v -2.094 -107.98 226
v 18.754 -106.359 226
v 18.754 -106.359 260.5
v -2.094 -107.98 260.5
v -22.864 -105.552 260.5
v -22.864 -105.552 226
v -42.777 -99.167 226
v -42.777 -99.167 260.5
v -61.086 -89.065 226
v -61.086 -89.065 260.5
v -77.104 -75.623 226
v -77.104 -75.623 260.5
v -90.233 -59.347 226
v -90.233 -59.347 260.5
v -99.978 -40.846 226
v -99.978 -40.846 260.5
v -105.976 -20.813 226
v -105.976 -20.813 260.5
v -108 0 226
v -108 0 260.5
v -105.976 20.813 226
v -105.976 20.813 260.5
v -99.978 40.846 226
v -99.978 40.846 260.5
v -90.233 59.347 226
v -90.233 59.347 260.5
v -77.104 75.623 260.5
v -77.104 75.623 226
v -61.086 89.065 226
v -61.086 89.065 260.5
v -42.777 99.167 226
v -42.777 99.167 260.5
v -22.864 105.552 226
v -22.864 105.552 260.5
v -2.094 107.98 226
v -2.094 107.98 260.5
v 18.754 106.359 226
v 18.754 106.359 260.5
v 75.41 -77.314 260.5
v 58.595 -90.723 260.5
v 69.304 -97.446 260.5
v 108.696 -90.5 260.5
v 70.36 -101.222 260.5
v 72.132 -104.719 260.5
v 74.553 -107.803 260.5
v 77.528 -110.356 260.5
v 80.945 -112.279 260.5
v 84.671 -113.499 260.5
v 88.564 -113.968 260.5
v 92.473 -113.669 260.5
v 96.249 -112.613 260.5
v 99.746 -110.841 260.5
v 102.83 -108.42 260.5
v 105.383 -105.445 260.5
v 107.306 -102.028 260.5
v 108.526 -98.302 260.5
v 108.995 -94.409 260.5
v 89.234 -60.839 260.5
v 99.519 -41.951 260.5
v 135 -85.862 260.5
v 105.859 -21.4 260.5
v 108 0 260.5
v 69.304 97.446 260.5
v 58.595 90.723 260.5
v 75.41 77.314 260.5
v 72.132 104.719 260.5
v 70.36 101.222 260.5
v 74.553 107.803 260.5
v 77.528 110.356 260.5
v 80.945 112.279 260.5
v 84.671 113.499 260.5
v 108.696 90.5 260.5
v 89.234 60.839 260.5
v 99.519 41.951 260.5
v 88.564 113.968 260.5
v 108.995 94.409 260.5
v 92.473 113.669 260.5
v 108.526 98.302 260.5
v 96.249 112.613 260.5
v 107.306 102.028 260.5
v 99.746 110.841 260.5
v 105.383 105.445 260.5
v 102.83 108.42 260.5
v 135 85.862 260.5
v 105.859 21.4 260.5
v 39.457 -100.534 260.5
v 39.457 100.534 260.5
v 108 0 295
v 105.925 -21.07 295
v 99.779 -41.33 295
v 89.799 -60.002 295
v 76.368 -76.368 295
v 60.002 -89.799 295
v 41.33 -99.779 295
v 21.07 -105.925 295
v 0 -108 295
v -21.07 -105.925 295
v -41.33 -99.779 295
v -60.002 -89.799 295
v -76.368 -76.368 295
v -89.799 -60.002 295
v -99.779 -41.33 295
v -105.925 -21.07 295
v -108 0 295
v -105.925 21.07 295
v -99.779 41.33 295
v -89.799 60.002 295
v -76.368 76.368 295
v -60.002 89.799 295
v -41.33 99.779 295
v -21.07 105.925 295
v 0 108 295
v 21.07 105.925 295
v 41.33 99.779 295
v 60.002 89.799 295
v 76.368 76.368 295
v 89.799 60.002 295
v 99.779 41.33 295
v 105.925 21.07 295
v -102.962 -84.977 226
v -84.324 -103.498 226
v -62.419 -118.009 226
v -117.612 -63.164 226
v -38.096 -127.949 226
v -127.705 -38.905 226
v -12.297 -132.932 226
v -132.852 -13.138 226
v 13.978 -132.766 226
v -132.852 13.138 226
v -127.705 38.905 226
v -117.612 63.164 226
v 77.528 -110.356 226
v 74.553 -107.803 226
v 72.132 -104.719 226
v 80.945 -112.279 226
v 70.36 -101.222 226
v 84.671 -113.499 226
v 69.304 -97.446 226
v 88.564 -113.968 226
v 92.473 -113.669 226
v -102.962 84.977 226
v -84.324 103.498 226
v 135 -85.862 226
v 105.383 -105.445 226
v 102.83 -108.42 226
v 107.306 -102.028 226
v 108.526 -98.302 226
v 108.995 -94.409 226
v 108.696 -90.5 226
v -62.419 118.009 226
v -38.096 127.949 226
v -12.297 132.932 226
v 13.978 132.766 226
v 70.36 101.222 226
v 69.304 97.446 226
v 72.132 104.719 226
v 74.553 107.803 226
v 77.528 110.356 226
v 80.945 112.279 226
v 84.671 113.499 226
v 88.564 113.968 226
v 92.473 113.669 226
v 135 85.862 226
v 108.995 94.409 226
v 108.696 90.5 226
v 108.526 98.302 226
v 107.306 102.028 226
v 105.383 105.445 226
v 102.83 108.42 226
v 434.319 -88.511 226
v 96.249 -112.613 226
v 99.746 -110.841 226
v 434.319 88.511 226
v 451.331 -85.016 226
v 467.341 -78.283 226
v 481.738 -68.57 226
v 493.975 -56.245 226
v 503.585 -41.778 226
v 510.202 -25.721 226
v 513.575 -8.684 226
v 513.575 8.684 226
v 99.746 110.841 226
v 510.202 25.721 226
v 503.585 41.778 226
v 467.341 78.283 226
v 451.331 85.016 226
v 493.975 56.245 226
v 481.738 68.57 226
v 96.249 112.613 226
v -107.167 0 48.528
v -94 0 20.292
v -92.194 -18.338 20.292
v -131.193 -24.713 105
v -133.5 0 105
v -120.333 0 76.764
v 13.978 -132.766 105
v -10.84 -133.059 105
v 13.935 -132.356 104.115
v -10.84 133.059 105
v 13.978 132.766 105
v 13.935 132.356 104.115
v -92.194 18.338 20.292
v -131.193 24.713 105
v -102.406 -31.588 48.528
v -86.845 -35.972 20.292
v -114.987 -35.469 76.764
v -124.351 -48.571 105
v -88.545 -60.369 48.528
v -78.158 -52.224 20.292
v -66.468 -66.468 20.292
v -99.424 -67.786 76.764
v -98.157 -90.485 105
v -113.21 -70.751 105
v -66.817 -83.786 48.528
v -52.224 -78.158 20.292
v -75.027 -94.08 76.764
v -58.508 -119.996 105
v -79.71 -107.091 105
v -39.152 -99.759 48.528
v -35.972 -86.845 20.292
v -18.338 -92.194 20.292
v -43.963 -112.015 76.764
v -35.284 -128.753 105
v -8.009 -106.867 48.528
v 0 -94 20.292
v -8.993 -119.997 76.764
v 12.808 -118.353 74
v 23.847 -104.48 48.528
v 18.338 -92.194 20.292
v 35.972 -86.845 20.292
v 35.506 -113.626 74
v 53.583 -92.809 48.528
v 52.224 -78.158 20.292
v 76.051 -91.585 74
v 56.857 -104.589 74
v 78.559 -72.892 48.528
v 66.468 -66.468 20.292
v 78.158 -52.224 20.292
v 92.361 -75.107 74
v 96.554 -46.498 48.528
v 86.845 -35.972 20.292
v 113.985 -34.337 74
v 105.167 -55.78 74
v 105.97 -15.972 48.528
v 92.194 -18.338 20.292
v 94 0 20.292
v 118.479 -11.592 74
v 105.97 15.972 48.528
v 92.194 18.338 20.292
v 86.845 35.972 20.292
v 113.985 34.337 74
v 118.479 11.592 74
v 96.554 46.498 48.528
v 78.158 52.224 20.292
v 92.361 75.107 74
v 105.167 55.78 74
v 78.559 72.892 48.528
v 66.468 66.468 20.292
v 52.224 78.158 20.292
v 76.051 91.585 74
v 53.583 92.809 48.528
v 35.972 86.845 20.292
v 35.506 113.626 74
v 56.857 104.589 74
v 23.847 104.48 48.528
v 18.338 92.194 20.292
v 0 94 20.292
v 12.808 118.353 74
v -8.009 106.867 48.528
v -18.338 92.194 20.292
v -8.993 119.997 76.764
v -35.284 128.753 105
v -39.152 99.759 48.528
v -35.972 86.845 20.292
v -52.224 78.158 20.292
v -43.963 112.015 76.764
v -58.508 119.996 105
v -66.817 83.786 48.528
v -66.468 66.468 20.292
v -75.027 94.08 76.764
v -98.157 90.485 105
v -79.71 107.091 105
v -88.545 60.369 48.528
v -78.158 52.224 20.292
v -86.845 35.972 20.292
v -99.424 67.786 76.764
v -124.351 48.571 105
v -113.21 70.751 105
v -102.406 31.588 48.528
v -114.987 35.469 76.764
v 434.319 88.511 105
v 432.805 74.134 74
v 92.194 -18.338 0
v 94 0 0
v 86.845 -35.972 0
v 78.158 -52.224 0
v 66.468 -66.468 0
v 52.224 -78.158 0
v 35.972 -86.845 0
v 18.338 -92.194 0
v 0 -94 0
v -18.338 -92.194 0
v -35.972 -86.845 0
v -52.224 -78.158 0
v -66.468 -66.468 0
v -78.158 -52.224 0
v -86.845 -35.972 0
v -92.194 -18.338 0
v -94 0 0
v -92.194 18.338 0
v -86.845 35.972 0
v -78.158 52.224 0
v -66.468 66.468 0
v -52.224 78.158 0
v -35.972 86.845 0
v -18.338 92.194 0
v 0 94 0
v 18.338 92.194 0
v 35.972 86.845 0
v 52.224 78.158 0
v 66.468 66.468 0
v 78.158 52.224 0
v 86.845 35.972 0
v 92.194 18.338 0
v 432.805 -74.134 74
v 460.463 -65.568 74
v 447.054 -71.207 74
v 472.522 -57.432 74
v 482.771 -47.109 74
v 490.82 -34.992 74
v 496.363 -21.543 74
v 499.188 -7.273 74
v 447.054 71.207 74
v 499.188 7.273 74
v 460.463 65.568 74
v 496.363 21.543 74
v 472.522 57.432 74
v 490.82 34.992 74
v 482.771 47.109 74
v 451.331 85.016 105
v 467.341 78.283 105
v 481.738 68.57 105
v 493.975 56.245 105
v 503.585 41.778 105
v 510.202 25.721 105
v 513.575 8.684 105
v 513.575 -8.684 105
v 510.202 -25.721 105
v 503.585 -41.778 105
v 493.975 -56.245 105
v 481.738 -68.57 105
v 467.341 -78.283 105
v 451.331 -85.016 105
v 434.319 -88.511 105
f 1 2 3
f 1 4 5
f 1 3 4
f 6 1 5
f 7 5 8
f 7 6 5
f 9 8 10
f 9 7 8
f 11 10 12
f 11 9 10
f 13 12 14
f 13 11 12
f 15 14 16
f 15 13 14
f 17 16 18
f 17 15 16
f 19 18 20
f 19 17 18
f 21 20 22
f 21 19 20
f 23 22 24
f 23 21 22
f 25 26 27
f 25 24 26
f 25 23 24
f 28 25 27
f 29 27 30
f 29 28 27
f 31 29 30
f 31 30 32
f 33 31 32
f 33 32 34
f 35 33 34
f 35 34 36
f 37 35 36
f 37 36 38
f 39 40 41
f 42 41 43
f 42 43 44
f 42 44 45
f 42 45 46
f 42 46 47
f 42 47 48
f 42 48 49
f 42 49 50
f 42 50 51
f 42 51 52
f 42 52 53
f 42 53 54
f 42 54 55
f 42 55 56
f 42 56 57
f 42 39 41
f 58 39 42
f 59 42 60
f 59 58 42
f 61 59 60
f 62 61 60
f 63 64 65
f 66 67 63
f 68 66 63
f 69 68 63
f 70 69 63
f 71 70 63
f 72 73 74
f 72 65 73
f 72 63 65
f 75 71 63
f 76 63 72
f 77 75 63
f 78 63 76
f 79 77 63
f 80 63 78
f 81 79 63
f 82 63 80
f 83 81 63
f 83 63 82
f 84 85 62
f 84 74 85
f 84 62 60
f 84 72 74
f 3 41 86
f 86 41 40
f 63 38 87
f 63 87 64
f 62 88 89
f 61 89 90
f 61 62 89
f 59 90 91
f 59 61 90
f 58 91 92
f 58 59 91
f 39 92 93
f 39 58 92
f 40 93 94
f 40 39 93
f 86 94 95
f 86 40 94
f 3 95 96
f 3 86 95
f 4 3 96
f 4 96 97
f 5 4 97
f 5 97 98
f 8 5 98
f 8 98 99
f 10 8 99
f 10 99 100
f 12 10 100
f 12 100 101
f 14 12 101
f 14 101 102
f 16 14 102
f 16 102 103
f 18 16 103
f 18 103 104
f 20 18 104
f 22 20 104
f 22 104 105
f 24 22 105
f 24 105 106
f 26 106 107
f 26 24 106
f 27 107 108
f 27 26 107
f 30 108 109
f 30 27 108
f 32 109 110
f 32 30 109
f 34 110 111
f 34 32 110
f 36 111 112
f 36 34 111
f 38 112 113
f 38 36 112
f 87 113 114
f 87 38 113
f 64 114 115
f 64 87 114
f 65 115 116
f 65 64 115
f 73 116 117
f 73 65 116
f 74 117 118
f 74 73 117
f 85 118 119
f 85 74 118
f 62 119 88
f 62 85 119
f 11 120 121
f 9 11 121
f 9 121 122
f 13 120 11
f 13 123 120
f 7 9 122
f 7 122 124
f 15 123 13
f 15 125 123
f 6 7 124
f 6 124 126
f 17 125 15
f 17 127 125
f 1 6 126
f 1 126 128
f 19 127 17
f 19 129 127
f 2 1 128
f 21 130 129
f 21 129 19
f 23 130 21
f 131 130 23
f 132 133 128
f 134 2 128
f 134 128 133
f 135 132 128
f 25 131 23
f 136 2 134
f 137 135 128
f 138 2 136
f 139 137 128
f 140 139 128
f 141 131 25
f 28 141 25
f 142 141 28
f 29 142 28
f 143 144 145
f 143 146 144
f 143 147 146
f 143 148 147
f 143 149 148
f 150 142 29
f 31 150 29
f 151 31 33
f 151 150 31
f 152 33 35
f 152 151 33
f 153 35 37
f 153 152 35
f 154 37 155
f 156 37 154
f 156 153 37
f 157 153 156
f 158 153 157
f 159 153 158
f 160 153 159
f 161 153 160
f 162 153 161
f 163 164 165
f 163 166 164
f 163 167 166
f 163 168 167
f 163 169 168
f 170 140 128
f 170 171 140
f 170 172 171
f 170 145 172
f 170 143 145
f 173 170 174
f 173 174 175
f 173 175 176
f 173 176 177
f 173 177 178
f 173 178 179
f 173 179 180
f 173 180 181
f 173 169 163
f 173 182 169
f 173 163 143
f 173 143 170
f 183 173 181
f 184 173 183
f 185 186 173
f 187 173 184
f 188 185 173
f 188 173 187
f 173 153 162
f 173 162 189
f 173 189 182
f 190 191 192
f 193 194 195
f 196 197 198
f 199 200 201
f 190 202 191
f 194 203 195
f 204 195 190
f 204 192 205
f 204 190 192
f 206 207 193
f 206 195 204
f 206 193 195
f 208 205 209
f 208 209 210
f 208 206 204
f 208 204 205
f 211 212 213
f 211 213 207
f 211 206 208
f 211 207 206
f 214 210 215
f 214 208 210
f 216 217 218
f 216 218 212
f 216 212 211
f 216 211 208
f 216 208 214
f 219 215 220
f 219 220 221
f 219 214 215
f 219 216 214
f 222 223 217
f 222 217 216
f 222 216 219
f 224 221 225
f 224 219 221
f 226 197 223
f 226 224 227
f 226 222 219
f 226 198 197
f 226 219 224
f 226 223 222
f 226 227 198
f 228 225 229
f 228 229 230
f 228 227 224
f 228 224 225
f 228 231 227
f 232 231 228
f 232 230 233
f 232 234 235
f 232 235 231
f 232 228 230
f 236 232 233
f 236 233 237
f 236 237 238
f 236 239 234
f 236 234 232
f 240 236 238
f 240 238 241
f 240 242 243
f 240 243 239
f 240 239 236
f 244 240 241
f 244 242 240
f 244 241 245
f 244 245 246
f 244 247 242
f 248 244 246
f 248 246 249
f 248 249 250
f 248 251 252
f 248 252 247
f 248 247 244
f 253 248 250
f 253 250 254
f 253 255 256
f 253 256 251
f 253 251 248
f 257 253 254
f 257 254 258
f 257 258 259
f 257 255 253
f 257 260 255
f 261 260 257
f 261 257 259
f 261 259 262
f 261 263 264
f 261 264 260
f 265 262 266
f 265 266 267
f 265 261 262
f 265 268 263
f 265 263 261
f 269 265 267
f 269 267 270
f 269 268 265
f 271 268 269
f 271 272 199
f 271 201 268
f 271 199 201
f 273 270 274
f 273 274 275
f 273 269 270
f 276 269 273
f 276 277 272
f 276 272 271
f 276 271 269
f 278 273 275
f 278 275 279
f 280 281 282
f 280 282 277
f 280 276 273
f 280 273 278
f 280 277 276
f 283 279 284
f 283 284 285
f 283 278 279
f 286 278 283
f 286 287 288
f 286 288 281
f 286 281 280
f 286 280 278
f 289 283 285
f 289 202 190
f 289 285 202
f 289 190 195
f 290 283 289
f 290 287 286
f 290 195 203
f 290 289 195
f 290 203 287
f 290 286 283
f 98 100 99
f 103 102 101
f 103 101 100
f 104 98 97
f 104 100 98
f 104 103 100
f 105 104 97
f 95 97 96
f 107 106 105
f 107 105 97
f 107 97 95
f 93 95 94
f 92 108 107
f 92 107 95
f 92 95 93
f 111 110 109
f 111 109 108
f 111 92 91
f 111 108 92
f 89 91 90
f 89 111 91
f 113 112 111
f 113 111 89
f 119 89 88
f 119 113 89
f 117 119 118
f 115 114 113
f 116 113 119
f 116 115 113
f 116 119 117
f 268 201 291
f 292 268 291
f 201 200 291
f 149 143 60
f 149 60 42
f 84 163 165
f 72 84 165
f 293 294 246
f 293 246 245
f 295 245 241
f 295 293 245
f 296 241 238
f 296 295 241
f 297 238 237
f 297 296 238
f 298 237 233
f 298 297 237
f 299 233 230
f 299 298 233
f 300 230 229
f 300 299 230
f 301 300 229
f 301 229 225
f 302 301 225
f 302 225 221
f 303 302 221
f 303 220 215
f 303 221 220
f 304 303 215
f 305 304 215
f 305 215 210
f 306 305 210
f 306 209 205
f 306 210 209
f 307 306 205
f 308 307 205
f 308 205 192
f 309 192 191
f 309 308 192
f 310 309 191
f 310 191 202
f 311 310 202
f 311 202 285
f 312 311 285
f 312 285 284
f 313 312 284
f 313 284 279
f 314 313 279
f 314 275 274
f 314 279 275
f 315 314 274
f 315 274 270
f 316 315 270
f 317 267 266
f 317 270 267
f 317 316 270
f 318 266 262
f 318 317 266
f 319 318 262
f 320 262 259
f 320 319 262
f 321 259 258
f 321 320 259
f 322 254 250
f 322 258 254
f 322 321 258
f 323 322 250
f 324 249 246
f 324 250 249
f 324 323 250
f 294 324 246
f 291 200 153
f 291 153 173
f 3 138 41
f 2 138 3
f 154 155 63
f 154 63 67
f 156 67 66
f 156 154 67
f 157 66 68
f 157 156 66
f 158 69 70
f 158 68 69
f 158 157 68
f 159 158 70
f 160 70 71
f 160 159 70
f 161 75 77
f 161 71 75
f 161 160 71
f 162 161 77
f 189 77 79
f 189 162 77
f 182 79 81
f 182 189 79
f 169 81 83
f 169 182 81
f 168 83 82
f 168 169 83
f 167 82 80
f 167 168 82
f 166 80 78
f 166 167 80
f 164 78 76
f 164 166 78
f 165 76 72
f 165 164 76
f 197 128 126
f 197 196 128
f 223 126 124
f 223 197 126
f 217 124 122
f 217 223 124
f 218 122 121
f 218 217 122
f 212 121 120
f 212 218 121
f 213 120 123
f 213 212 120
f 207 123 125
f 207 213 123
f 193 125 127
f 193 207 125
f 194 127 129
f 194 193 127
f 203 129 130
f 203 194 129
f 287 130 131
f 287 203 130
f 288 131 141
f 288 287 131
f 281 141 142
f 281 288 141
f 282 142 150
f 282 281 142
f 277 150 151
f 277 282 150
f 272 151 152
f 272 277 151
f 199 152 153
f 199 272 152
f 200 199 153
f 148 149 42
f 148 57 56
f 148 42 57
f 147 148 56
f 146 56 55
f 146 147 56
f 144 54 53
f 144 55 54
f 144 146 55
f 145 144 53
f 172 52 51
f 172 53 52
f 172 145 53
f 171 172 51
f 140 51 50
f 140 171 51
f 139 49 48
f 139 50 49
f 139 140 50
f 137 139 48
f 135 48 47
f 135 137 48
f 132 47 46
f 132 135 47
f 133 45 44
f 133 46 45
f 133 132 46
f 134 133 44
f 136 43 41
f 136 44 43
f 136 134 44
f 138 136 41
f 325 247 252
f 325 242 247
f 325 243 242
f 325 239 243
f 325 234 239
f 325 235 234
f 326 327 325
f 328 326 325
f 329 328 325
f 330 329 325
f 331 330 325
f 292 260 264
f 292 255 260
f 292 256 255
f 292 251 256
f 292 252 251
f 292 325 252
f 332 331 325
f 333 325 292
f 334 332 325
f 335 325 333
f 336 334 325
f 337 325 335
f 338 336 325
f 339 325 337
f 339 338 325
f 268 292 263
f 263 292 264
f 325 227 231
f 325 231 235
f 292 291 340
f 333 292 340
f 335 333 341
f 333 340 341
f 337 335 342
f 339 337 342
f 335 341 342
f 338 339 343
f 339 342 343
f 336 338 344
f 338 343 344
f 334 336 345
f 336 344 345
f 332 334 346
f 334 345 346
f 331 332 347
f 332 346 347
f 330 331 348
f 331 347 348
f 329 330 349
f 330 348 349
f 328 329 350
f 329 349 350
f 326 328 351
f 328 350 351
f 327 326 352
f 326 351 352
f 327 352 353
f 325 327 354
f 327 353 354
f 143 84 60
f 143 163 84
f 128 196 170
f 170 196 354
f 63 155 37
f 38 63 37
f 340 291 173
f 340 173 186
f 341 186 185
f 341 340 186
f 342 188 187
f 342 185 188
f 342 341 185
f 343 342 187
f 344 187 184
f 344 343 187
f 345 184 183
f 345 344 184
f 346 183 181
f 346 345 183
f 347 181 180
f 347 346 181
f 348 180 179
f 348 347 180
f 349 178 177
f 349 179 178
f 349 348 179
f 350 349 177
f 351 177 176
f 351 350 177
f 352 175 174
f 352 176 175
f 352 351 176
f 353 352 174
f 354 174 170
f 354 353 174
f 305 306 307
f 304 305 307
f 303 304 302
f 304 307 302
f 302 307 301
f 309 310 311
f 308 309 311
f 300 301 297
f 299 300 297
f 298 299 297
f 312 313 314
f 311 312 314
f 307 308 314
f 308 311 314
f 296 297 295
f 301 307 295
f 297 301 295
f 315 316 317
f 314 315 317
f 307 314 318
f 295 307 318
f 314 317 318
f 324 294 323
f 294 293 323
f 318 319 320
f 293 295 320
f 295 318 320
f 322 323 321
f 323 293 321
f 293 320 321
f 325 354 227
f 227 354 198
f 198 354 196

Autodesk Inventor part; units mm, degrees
ref_plane "YZ Plane" through (0, 0, 0) normal (1, 0, 0) x (0, 1, 0)
sketch "Sketch1" plane through (0, 0, 0) normal (0, 0, 1) x (1, 0, 0)
  circle A0 centre (0, 0) radius 94
  dimension "d0" = 188
extrude "Extrusion1" add sketch "Sketch1" along normal blind 20.292
ref_plane "Work Plane1" through (0, 0, 105) normal (0, 0, -1) x (-1, 0, 0)
sketch "Sketch2" plane through (0, 0, 105) normal (0, 0, -1) x (-1, 0, 0)
  circle A0 centre (0, 0) radius 133.5
  dimension "d4" = 267
loft "Loft1" add profiles "Sketch2" section 2 edges at (-94, 0, 20.292)
sketch "Sketch3" plane through (0, 0, 105) normal (0, 0, 1) x (1, 0, 0)
  circle A0 centre (0, 0) radius 133.5 construction
  circle A1 centre (425, 0) radius 89 construction
  line L0 (13.9782, 132.7662) -> (434.3188, 88.5108)
  circle A2 centre (0, 0) radius 133.5 projected
  line L1 (13.9782, -132.7662) -> (434.3188, -88.5108)
  arc A3 (13.9782, 132.7662) -> (13.9782, -132.7662) centre (0, 0) ccw
  arc A4 (434.3188, -88.5108) -> (434.3188, 88.5108) centre (425, 0) ccw
  dimension "d9" = 178
  dimension "d10" = 425
extrude "Extrusion2" add sketch "Sketch3" along normal blind 121
ref_plane "Work Plane2" through (0, 0, 74) normal (0, 0, -1) x (-1, 0, 0)
sketch "Sketch4" plane through (0, 0, 74) normal (0, 0, -1) x (-1, 0, 0)
  arc A0 (-434.3188, 88.5108) -> (-434.3188, -88.5108) centre (-425, 0) ccw construction
  circle A1 centre (-425, 0) radius 74.544 construction
  circle A2 centre (0, 0) radius 119.044 construction
  line L0 (-12.4646, -118.3896) -> (-432.8052, -74.1342)
  line L1 (-12.4646, 118.3896) -> (-432.8052, 74.1342)
  line L2 (-13.9782, -132.7662) -> (-434.3188, -88.5108) projected
  line L3 (-434.3188, 88.5108) -> (-13.9782, 132.7662) projected
  arc A3 (-12.4646, -118.3896) -> (-12.4646, 118.3896) centre (0, 0) ccw
  arc A4 (-432.8052, 74.1342) -> (-432.8052, -74.1342) centre (-425, 0) ccw
  dimension "d14" = 149.088
  dimension "d15" = 238.088
loft "Loft2" add profiles "Sketch4" section 2 edges at (133.5, 0, 105) (224.1485, 110.6385, 105) (514, 0, 105) (224.1485, -110.6385, 105)
sketch "Sketch7" plane through (0, 0, 226) normal (0, 0, 1) x (1, 0, 0)
  circle A0 centre (0, 0) radius 108 construction
  line L0 (135, 85.862) -> (135, -85.862)
  line L1 (135, -85.862) -> (135, 85.862) construction
  line L2 (18.7539, 106.3592) -> (135, 85.862) construction
  line L3 (135, -85.862) -> (18.7539, -106.3592) construction
  circle A1 centre (89, 93.973) radius 20 construction
  circle A2 centre (89, -93.973) radius 20 construction
  line L4 (135, 85.862) -> (108.6962, 90.5001)
  line L5 (135, -85.862) -> (108.6962, -90.5001)
  arc A3 (69.3038, -97.446) -> (108.6962, -90.5001) centre (89, -93.973) ccw
  arc A4 (108.6962, 90.5001) -> (69.3038, 97.446) centre (89, 93.973) ccw
  line L6 (69.3038, 97.446) -> (18.7539, 106.3592)
  line L7 (69.3038, -97.446) -> (18.7539, -106.3592)
  arc A5 (18.7539, 106.3592) -> (18.7539, -106.3592) centre (0, 0) ccw
  point P0 (135, 0)
  dimension "d33" = 40
  dimension "d30" = 216
  dimension "d31" = 171.724
  dimension "d32" = 135
  dimension "d34" = 89
extrude "Extrusion5" add sketch "Sketch7" along normal blind 34.5
sketch "Sketch8" plane through (0, 0, 260.5) normal (0, 0, 1) x (1, 0, 0)
  circle A0 centre (0, 0) radius 108
  arc A1 (18.7539, 106.3592) -> (18.7539, -106.3592) centre (0, 0) ccw construction
  point P0 (-108, 0)
extrude "Extrusion6" add sketch "Sketch8" along normal blind 34.5
properties part number "1"
